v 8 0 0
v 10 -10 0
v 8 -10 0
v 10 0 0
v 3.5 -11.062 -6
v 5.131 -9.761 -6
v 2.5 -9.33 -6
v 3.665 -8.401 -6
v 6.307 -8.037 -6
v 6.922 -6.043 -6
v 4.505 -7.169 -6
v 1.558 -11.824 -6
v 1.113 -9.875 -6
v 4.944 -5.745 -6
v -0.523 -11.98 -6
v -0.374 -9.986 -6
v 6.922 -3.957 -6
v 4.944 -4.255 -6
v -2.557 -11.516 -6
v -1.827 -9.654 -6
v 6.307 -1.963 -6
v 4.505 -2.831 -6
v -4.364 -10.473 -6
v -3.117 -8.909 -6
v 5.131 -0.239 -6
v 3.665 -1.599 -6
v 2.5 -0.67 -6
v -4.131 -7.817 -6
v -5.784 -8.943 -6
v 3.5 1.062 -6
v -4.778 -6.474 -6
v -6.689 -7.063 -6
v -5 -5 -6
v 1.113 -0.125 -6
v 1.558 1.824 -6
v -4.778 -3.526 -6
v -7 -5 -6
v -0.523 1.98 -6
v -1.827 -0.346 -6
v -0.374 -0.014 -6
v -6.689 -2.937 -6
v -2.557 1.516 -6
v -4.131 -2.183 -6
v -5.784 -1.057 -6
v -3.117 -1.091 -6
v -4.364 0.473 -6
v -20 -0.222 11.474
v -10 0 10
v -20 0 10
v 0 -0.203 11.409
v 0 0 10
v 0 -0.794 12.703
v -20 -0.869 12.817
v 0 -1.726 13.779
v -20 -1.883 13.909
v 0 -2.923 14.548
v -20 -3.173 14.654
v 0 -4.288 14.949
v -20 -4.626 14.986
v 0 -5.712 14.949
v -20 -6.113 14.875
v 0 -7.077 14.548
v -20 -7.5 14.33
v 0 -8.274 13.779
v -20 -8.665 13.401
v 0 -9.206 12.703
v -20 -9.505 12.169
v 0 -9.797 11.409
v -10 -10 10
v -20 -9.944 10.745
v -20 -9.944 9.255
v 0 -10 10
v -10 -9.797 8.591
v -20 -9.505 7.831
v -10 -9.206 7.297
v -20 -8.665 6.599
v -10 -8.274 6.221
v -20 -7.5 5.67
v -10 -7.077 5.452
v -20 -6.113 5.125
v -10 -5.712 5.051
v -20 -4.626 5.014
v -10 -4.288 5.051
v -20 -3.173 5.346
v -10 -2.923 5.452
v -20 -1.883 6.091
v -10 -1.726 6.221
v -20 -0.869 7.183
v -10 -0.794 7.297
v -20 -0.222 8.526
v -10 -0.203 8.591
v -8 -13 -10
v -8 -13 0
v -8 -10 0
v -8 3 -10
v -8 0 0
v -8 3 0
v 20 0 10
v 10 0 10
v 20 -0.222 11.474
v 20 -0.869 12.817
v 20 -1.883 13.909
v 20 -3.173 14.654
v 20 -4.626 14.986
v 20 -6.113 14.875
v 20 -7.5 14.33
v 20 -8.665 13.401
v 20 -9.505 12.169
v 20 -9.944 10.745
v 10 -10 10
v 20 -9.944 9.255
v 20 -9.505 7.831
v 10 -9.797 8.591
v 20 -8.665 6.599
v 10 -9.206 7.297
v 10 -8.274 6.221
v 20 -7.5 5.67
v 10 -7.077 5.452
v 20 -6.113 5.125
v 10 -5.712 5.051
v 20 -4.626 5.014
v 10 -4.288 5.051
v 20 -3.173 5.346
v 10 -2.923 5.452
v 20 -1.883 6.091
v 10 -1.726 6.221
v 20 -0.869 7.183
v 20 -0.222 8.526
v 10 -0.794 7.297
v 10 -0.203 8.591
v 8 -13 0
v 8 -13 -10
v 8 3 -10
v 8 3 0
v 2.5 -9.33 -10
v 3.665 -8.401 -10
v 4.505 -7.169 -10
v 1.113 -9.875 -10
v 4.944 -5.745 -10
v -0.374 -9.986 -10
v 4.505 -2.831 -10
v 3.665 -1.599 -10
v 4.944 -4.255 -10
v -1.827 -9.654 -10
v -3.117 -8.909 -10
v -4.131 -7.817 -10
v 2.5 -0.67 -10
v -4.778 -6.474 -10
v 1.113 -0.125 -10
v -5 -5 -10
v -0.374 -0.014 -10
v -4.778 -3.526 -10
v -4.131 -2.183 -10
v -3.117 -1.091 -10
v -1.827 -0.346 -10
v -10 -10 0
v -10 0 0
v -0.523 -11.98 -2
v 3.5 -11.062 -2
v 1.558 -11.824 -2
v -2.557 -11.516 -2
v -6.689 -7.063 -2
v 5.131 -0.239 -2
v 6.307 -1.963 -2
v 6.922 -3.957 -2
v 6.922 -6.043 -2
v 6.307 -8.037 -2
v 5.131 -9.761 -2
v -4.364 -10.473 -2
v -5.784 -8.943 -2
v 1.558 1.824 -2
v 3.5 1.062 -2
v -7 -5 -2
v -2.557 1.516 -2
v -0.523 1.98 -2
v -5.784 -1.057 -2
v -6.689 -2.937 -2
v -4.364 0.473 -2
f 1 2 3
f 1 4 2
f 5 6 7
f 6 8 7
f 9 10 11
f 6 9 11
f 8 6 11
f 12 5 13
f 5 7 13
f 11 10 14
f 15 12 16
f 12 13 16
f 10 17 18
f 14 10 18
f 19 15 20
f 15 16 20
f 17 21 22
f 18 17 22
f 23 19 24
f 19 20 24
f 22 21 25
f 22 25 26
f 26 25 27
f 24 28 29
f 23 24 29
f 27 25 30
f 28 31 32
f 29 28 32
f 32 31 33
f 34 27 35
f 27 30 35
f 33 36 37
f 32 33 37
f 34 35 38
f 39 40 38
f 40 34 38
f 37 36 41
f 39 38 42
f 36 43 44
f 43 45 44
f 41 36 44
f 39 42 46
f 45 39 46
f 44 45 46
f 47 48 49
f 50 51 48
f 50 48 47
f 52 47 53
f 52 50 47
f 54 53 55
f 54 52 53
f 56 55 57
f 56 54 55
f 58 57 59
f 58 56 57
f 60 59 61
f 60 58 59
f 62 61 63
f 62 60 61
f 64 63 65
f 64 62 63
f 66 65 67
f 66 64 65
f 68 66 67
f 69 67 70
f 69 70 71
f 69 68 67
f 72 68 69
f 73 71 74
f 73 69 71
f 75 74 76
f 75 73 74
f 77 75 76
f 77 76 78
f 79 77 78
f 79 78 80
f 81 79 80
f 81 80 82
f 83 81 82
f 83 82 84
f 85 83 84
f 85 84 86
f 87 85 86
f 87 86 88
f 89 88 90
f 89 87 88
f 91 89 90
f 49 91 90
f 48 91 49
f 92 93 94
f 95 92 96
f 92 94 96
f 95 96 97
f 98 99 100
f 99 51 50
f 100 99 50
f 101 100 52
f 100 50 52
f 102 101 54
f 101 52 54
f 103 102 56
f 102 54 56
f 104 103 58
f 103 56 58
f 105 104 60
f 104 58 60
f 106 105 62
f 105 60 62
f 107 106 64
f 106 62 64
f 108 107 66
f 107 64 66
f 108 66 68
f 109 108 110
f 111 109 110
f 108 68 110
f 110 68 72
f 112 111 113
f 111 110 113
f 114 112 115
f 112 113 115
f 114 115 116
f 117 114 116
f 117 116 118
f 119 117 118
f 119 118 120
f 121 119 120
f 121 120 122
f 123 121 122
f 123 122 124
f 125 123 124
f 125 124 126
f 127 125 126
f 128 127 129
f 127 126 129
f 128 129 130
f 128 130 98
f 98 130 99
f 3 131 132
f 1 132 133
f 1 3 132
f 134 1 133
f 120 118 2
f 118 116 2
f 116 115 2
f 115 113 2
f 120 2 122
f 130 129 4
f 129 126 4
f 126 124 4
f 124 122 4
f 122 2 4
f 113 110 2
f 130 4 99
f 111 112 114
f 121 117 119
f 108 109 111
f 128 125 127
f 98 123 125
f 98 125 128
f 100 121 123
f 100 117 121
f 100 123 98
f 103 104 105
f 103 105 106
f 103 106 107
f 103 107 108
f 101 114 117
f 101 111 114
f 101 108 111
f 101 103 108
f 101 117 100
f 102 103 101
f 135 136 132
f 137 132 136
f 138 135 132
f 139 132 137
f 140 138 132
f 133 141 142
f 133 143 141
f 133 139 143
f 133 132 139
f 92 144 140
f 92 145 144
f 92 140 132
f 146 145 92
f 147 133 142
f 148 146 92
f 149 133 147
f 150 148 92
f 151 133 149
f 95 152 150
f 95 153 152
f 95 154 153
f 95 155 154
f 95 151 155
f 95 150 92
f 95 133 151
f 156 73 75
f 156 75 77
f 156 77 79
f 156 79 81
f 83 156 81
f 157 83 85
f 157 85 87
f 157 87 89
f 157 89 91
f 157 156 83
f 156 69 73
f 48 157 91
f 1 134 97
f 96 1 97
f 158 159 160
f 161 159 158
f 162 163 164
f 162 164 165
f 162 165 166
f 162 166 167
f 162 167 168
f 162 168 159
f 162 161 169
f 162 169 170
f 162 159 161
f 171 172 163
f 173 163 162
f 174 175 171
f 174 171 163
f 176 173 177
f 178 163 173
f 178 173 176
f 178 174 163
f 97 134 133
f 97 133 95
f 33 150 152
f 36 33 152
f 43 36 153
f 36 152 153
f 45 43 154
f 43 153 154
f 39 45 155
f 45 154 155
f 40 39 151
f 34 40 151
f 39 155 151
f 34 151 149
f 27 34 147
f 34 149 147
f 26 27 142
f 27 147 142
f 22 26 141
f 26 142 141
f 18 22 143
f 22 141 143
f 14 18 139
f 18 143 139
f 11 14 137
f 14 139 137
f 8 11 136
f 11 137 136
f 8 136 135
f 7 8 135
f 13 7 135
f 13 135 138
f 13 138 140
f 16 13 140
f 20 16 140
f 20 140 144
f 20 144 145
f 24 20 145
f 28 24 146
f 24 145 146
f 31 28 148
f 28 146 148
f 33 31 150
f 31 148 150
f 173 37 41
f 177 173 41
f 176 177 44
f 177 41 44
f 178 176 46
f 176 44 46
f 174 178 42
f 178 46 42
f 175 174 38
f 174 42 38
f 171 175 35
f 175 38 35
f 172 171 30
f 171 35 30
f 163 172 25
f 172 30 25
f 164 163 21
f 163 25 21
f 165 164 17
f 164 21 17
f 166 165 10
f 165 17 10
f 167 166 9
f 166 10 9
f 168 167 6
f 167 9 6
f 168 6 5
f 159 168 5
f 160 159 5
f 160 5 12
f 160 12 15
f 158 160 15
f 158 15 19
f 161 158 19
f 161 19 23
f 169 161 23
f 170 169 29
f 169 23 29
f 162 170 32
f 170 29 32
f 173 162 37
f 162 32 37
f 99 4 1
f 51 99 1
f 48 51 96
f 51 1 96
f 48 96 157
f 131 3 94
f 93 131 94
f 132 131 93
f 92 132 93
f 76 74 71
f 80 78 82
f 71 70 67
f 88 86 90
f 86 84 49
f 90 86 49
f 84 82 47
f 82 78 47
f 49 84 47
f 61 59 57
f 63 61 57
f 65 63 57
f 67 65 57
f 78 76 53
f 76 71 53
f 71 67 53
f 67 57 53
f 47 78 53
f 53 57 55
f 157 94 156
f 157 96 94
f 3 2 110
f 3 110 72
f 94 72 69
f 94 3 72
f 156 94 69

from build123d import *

# Parameters (mm, degrees)
SKETCH2_W           = 10
SKETCH2_H           = 10
BOSS_EXTRUDE1_DEPTH = 10
SKETCH3_R           = 5
BOSS_EXTRUDE2_DEPTH = 20
SKETCH4_W           = 16
SKETCH4_H           = 16
BOSS_EXTRUDE3_DEPTH = 10
SKETCH5_R           = 5
CUT_EXTRUDE1_DEPTH  = 4
SKETCH6_R           = 7
CUT_EXTRUDE2_DEPTH  = 4


with BuildPart() as part:
    # Sketch2 → Boss-Extrude1 (new body)
    with BuildSketch(Plane.XY):
        with Locations((5, -5)):
            Rectangle(SKETCH2_W, SKETCH2_H)
    boss_extrude1 = extrude(amount=BOSS_EXTRUDE1_DEPTH)

    # Sketch3 → Boss-Extrude2 (add)
    with BuildSketch(Plane(origin=(0, 0, 0), x_dir=(0, 0, -1), z_dir=(1, 0, 0))):
        with Locations(Location((-10, -5, 0), (0, 0, 90))):
            Circle(SKETCH3_R)
    boss_extrude2 = extrude(amount=BOSS_EXTRUDE2_DEPTH)

    # Mirror1: Boss-Extrude1, Boss-Extrude2 across plane
    add(boss_extrude1.mirror(Plane(origin=(0, 0, 10), x_dir=(0, 0, 1), z_dir=(1, 0, 0))))
    add(boss_extrude2.mirror(Plane(origin=(0, 0, 10), x_dir=(0, 0, 1), z_dir=(1, 0, 0))))

    # Sketch4 → Boss-Extrude3 (add)
    with BuildSketch(Plane(origin=(0, 0, 0), x_dir=(-1, 0, 0), z_dir=(0, 0, -1))):
        with Locations((0, -5)):
            Rectangle(SKETCH4_W, SKETCH4_H)
    extrude(amount=BOSS_EXTRUDE3_DEPTH)

    # Sketch5 → Cut-Extrude1 (cut)
    with BuildSketch(Plane(origin=(0, 0, -10), x_dir=(-1, 0, 0), z_dir=(0, 0, -1))):
        with Locations((0, -5)):
            Circle(SKETCH5_R)
    extrude(amount=-CUT_EXTRUDE1_DEPTH, mode=Mode.SUBTRACT)

    # Sketch6 → Cut-Extrude2 (cut)
    with BuildSketch(Plane(origin=(0, 0, -6), x_dir=(-1, 0, 0), z_dir=(0, 0, -1))):
        with Locations((0, -5)):
            Circle(SKETCH6_R)
    extrude(amount=-CUT_EXTRUDE2_DEPTH, mode=Mode.SUBTRACT)


solid = part.part
